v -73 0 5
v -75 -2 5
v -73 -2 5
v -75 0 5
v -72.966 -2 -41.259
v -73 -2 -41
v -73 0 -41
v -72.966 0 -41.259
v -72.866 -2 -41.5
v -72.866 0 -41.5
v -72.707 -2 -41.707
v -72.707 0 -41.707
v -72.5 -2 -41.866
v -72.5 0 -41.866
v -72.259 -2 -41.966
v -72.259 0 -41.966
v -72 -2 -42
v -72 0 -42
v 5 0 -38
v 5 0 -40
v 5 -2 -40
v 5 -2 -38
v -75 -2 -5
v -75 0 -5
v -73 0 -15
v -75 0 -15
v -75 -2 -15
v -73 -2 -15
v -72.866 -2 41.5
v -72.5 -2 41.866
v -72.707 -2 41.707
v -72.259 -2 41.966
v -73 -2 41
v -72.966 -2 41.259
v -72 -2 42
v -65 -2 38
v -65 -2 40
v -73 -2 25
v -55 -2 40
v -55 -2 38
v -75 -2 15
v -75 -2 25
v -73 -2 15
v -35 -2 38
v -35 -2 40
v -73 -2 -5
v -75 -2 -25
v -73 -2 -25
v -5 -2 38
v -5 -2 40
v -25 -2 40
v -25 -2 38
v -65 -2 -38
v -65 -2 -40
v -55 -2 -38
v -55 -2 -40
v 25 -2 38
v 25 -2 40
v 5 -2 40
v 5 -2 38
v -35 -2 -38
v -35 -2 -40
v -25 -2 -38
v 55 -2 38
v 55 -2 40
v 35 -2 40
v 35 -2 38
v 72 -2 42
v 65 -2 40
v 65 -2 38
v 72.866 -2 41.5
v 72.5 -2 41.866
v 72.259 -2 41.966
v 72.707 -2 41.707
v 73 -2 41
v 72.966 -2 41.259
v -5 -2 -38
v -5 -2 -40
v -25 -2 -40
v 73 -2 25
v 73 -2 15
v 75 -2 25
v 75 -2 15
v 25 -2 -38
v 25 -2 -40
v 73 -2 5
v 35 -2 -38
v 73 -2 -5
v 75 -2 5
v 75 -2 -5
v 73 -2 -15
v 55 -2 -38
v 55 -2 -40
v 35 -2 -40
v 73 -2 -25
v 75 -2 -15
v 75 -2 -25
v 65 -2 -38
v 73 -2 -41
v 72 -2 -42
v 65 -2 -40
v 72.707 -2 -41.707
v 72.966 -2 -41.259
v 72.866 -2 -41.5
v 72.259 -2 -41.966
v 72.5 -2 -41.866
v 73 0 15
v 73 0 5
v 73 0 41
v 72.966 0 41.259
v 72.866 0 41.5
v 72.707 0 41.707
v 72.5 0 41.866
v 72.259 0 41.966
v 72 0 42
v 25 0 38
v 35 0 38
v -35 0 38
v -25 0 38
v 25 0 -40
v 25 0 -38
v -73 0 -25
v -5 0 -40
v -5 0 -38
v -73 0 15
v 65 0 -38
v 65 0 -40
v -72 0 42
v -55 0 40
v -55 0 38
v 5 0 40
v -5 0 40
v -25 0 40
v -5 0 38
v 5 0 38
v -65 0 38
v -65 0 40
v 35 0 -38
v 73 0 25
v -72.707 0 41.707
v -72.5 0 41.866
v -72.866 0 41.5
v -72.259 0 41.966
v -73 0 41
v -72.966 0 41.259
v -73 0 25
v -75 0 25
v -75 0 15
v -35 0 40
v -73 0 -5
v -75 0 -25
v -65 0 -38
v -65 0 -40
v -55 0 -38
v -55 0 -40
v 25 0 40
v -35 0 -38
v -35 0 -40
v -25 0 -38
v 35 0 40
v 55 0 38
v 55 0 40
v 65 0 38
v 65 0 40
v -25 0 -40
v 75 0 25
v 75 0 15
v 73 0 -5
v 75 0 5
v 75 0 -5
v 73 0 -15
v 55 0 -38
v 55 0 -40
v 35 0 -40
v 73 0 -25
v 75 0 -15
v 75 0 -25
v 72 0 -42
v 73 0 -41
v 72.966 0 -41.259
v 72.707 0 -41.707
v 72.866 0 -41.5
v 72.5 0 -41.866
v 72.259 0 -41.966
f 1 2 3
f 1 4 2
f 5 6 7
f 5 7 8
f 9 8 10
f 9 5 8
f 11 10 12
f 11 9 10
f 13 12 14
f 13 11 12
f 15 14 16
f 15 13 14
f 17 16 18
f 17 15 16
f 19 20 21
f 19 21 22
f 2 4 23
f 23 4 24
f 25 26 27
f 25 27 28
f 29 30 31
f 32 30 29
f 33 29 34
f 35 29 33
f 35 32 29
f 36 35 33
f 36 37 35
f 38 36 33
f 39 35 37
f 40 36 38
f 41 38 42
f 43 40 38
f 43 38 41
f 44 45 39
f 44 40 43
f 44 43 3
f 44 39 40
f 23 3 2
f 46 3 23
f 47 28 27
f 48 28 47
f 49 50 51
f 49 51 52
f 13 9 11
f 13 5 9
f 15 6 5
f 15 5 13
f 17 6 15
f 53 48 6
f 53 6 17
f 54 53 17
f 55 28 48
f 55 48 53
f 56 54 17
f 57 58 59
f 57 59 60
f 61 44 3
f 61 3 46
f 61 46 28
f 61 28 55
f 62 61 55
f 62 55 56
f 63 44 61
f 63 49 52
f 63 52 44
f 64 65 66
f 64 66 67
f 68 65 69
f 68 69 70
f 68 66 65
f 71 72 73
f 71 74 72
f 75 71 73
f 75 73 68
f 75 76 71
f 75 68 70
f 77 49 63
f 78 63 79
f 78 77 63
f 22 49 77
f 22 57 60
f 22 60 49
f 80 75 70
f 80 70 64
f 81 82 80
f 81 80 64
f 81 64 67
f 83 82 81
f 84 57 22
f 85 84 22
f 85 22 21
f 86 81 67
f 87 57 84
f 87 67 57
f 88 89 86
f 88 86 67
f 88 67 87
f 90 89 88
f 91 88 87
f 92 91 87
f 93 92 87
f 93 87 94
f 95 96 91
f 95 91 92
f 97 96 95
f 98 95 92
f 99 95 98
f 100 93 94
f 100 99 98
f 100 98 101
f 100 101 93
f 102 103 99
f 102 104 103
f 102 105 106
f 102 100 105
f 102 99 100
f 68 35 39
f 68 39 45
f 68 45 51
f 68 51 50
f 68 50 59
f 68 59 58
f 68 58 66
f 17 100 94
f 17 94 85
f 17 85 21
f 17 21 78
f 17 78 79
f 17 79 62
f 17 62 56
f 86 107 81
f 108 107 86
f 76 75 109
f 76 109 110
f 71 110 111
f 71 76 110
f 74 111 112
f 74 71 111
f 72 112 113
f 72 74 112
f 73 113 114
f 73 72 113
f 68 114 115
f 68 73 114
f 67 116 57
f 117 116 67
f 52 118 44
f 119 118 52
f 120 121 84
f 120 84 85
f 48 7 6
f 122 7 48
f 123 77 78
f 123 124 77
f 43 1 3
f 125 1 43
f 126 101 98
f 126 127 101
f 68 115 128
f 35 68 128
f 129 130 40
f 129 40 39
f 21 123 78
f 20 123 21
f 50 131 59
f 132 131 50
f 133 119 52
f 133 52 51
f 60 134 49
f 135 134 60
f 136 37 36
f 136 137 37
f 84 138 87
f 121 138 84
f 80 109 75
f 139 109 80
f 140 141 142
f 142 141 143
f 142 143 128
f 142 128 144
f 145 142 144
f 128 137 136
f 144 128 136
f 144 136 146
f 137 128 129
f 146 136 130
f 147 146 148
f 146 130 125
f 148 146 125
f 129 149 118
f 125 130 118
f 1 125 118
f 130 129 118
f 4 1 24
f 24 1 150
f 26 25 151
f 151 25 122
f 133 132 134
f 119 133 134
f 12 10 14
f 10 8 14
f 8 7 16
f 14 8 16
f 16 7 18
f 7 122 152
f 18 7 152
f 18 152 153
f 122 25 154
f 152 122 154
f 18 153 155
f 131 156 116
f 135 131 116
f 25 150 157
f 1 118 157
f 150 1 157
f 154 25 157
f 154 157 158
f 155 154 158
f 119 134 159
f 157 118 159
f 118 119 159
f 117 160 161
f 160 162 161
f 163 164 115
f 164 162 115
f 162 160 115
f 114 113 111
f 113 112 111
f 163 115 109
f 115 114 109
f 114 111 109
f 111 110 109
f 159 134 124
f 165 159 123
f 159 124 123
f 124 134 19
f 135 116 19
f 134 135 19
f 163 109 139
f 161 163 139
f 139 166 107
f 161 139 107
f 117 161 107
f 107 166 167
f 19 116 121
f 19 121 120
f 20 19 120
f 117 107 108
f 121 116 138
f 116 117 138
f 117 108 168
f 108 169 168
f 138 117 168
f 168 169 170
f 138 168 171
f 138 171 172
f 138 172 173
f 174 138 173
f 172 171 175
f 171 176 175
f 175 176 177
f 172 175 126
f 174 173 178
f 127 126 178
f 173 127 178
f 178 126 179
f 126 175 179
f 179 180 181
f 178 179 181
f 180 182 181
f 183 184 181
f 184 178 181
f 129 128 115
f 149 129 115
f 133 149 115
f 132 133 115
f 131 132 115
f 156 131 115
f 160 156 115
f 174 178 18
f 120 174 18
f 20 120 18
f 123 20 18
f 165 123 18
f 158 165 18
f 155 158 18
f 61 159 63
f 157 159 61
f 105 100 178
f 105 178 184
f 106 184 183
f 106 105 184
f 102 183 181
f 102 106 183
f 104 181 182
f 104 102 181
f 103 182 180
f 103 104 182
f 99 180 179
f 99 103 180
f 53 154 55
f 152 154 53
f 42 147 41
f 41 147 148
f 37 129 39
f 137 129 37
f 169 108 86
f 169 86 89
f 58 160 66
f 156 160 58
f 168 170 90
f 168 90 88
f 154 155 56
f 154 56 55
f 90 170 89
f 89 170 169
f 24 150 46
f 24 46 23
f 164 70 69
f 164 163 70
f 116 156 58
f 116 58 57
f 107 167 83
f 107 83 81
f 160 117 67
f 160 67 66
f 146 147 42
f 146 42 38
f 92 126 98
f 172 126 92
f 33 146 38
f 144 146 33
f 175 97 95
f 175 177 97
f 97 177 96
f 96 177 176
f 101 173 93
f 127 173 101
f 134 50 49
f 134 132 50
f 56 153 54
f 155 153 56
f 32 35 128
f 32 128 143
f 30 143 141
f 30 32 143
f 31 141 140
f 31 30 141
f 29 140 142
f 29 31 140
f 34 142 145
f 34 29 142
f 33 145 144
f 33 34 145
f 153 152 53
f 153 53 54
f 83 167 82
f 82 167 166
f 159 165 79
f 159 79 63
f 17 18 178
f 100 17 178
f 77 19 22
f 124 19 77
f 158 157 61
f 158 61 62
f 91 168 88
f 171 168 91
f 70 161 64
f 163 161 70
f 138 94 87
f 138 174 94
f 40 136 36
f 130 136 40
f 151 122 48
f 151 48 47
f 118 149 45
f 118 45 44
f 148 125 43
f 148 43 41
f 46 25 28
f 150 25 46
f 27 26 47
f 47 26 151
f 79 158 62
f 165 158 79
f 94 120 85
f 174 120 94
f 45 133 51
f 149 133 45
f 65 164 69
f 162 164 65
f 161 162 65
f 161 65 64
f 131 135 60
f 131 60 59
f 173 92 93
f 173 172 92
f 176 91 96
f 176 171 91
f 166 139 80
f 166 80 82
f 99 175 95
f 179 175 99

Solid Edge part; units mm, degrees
sketch "Sketch1" plane through (0, 0, 0) normal (0, -1, 0) x (1, 0, 0)
  line L0 (75, -42) -> (75, 42)
  line L1 (75, 42) -> (-75, 42)
  line L2 (-75, 42) -> (-75, -42)
  line L3 (-75, -42) -> (75, -42)
extrude "Protrusion1" add sketch "Sketch1" along normal blind 2
sketch "Sketch2" plane through (0, 0, 0) normal (0, -1, 0) x (1, 0, 0)
  line L0 (-55, 38) -> (-55, 40)
  line L1 (-55, 40) -> (-65, 40)
  line L2 (-65, 40) -> (-65, 38)
  line L3 (-65, 38) -> (-55, 38)
  line L4 (-25, 40) -> (-35, 40)
  line L5 (-35, 40) -> (-35, 38)
  line L6 (-35, 38) -> (-25, 38)
  line L7 (-25, 38) -> (-25, 40)
  line L8 (-5, 38) -> (5, 38)
  line L9 (5, 38) -> (5, 40)
  line L10 (5, 40) -> (-5, 40)
  line L11 (-5, 40) -> (-5, 38)
  line L12 (25, 38) -> (35, 38)
  line L13 (35, 38) -> (35, 40)
  line L14 (35, 40) -> (25, 40)
  line L15 (25, 40) -> (25, 38)
  line L16 (55, 38) -> (65, 38)
  line L17 (65, 38) -> (65, 40)
  line L18 (65, 40) -> (55, 40)
  line L19 (55, 40) -> (55, 38)
  line L20 (65, -40) -> (65, -38)
  line L21 (65, -38) -> (55, -38)
  line L22 (55, -38) -> (55, -40)
  line L23 (55, -40) -> (65, -40)
  line L24 (25, -40) -> (35, -40)
  line L25 (35, -40) -> (35, -38)
  line L26 (35, -38) -> (25, -38)
  line L27 (25, -38) -> (25, -40)
  line L28 (5, -38) -> (-5, -38)
  line L29 (-5, -38) -> (-5, -40)
  line L30 (-5, -40) -> (5, -40)
  line L31 (5, -40) -> (5, -38)
  line L32 (-25, -38) -> (-35, -38)
  line L33 (-35, -38) -> (-35, -40)
  line L34 (-35, -40) -> (-25, -40)
  line L35 (-25, -40) -> (-25, -38)
  line L36 (-55, -40) -> (-55, -38)
  line L37 (-55, -38) -> (-65, -38)
  line L38 (-65, -38) -> (-65, -40)
  line L39 (-65, -40) -> (-55, -40)
  line L40 (-73, -42) -> (-73, -25)
  line L41 (-73, -25) -> (-75, -25)
  line L42 (-75, -25) -> (-75, -42)
  line L43 (-75, -42) -> (-73, -42)
  line L44 (-73, -15) -> (-73, -5)
  line L45 (-73, -5) -> (-75, -5)
  line L46 (-75, -5) -> (-75, -15)
  line L47 (-75, -15) -> (-73, -15)
  line L48 (-73, 5) -> (-73, 15)
  line L49 (-73, 15) -> (-75, 15)
  line L50 (-75, 15) -> (-75, 5)
  line L51 (-75, 5) -> (-73, 5)
  line L52 (-73, 25) -> (-73, 42)
  line L53 (-73, 42) -> (-75, 42)
  line L54 (-75, 42) -> (-75, 25)
  line L55 (-75, 25) -> (-73, 25)
  line L56 (75, 25) -> (75, 42)
  line L57 (75, 42) -> (73, 42)
  line L58 (73, 42) -> (73, 25)
  line L59 (73, 25) -> (75, 25)
  line L60 (73, 15) -> (73, 5)
  line L61 (73, 5) -> (75, 5)
  line L62 (75, 5) -> (75, 15)
  line L63 (75, 15) -> (73, 15)
  line L64 (73, -5) -> (73, -15)
  line L65 (73, -15) -> (75, -15)
  line L66 (75, -15) -> (75, -5)
  line L67 (75, -5) -> (73, -5)
  line L68 (73, -25) -> (73, -42)
  line L69 (73, -42) -> (75, -42)
  line L70 (75, -42) -> (75, -25)
  line L71 (75, -25) -> (73, -25)
  dimension "D1" = 10
  dimension "D2" = 2
  dimension "D3" = 10
  dimension "D4" = 2
  dimension "D5" = 10
  dimension "D6" = 2
  dimension "D7" = 10
  dimension "D8" = 2
  dimension "D9" = 10
  dimension "D10" = 2
  dimension "D11" = 10
  dimension "D12" = 2
  dimension "D13" = 20
  dimension "D14" = 2
  dimension "D15" = 20
  dimension "D16" = 2
  dimension "D17" = 20
  dimension "D18" = 2
  dimension "D19" = 20
  dimension "D20" = 2
  dimension "D21" = 2
  dimension "D22" = 17
  dimension "D23" = 2
  dimension "D24" = 10
  dimension "D25" = 2
  dimension "D26" = 10
  dimension "D27" = 2
  dimension "D28" = 17
  dimension "D29" = 10
  dimension "D30" = 2
  dimension "D31" = 10
  dimension "D32" = 2
  dimension "D33" = 10
  dimension "D34" = 2
  dimension "D35" = 10
  dimension "D36" = 2
  dimension "D37" = 10
  dimension "D38" = 2
  dimension "D39" = 10
  dimension "D40" = 10
  dimension "D41" = 10
  dimension "D42" = 2
  dimension "D43" = 10
  dimension "D44" = 2
  dimension "D45" = 2
  dimension "D46" = 2
  dimension "D47" = 2
  dimension "D48" = 20
  dimension "D49" = 20
  dimension "D50" = 20
  dimension "D51" = 20
  dimension "D52" = 2
  dimension "D53" = 17
  dimension "D54" = 2
  dimension "D55" = 10
  dimension "D56" = 2
  dimension "D57" = 17
  dimension "D58" = 2
  dimension "D59" = 10
  dimension "D60" = 10
  dimension "D61" = 10
extrude "ExtrudedCutout_1" cut sketch "Sketch2" along normal blind 2
fillet "Round_1" radius 1 4 edges at (-73, -1, -42) (73, -1, -42) (73, -1, 42) (-73, -1, 42)
properties material "Acrylic, high impact grade"
